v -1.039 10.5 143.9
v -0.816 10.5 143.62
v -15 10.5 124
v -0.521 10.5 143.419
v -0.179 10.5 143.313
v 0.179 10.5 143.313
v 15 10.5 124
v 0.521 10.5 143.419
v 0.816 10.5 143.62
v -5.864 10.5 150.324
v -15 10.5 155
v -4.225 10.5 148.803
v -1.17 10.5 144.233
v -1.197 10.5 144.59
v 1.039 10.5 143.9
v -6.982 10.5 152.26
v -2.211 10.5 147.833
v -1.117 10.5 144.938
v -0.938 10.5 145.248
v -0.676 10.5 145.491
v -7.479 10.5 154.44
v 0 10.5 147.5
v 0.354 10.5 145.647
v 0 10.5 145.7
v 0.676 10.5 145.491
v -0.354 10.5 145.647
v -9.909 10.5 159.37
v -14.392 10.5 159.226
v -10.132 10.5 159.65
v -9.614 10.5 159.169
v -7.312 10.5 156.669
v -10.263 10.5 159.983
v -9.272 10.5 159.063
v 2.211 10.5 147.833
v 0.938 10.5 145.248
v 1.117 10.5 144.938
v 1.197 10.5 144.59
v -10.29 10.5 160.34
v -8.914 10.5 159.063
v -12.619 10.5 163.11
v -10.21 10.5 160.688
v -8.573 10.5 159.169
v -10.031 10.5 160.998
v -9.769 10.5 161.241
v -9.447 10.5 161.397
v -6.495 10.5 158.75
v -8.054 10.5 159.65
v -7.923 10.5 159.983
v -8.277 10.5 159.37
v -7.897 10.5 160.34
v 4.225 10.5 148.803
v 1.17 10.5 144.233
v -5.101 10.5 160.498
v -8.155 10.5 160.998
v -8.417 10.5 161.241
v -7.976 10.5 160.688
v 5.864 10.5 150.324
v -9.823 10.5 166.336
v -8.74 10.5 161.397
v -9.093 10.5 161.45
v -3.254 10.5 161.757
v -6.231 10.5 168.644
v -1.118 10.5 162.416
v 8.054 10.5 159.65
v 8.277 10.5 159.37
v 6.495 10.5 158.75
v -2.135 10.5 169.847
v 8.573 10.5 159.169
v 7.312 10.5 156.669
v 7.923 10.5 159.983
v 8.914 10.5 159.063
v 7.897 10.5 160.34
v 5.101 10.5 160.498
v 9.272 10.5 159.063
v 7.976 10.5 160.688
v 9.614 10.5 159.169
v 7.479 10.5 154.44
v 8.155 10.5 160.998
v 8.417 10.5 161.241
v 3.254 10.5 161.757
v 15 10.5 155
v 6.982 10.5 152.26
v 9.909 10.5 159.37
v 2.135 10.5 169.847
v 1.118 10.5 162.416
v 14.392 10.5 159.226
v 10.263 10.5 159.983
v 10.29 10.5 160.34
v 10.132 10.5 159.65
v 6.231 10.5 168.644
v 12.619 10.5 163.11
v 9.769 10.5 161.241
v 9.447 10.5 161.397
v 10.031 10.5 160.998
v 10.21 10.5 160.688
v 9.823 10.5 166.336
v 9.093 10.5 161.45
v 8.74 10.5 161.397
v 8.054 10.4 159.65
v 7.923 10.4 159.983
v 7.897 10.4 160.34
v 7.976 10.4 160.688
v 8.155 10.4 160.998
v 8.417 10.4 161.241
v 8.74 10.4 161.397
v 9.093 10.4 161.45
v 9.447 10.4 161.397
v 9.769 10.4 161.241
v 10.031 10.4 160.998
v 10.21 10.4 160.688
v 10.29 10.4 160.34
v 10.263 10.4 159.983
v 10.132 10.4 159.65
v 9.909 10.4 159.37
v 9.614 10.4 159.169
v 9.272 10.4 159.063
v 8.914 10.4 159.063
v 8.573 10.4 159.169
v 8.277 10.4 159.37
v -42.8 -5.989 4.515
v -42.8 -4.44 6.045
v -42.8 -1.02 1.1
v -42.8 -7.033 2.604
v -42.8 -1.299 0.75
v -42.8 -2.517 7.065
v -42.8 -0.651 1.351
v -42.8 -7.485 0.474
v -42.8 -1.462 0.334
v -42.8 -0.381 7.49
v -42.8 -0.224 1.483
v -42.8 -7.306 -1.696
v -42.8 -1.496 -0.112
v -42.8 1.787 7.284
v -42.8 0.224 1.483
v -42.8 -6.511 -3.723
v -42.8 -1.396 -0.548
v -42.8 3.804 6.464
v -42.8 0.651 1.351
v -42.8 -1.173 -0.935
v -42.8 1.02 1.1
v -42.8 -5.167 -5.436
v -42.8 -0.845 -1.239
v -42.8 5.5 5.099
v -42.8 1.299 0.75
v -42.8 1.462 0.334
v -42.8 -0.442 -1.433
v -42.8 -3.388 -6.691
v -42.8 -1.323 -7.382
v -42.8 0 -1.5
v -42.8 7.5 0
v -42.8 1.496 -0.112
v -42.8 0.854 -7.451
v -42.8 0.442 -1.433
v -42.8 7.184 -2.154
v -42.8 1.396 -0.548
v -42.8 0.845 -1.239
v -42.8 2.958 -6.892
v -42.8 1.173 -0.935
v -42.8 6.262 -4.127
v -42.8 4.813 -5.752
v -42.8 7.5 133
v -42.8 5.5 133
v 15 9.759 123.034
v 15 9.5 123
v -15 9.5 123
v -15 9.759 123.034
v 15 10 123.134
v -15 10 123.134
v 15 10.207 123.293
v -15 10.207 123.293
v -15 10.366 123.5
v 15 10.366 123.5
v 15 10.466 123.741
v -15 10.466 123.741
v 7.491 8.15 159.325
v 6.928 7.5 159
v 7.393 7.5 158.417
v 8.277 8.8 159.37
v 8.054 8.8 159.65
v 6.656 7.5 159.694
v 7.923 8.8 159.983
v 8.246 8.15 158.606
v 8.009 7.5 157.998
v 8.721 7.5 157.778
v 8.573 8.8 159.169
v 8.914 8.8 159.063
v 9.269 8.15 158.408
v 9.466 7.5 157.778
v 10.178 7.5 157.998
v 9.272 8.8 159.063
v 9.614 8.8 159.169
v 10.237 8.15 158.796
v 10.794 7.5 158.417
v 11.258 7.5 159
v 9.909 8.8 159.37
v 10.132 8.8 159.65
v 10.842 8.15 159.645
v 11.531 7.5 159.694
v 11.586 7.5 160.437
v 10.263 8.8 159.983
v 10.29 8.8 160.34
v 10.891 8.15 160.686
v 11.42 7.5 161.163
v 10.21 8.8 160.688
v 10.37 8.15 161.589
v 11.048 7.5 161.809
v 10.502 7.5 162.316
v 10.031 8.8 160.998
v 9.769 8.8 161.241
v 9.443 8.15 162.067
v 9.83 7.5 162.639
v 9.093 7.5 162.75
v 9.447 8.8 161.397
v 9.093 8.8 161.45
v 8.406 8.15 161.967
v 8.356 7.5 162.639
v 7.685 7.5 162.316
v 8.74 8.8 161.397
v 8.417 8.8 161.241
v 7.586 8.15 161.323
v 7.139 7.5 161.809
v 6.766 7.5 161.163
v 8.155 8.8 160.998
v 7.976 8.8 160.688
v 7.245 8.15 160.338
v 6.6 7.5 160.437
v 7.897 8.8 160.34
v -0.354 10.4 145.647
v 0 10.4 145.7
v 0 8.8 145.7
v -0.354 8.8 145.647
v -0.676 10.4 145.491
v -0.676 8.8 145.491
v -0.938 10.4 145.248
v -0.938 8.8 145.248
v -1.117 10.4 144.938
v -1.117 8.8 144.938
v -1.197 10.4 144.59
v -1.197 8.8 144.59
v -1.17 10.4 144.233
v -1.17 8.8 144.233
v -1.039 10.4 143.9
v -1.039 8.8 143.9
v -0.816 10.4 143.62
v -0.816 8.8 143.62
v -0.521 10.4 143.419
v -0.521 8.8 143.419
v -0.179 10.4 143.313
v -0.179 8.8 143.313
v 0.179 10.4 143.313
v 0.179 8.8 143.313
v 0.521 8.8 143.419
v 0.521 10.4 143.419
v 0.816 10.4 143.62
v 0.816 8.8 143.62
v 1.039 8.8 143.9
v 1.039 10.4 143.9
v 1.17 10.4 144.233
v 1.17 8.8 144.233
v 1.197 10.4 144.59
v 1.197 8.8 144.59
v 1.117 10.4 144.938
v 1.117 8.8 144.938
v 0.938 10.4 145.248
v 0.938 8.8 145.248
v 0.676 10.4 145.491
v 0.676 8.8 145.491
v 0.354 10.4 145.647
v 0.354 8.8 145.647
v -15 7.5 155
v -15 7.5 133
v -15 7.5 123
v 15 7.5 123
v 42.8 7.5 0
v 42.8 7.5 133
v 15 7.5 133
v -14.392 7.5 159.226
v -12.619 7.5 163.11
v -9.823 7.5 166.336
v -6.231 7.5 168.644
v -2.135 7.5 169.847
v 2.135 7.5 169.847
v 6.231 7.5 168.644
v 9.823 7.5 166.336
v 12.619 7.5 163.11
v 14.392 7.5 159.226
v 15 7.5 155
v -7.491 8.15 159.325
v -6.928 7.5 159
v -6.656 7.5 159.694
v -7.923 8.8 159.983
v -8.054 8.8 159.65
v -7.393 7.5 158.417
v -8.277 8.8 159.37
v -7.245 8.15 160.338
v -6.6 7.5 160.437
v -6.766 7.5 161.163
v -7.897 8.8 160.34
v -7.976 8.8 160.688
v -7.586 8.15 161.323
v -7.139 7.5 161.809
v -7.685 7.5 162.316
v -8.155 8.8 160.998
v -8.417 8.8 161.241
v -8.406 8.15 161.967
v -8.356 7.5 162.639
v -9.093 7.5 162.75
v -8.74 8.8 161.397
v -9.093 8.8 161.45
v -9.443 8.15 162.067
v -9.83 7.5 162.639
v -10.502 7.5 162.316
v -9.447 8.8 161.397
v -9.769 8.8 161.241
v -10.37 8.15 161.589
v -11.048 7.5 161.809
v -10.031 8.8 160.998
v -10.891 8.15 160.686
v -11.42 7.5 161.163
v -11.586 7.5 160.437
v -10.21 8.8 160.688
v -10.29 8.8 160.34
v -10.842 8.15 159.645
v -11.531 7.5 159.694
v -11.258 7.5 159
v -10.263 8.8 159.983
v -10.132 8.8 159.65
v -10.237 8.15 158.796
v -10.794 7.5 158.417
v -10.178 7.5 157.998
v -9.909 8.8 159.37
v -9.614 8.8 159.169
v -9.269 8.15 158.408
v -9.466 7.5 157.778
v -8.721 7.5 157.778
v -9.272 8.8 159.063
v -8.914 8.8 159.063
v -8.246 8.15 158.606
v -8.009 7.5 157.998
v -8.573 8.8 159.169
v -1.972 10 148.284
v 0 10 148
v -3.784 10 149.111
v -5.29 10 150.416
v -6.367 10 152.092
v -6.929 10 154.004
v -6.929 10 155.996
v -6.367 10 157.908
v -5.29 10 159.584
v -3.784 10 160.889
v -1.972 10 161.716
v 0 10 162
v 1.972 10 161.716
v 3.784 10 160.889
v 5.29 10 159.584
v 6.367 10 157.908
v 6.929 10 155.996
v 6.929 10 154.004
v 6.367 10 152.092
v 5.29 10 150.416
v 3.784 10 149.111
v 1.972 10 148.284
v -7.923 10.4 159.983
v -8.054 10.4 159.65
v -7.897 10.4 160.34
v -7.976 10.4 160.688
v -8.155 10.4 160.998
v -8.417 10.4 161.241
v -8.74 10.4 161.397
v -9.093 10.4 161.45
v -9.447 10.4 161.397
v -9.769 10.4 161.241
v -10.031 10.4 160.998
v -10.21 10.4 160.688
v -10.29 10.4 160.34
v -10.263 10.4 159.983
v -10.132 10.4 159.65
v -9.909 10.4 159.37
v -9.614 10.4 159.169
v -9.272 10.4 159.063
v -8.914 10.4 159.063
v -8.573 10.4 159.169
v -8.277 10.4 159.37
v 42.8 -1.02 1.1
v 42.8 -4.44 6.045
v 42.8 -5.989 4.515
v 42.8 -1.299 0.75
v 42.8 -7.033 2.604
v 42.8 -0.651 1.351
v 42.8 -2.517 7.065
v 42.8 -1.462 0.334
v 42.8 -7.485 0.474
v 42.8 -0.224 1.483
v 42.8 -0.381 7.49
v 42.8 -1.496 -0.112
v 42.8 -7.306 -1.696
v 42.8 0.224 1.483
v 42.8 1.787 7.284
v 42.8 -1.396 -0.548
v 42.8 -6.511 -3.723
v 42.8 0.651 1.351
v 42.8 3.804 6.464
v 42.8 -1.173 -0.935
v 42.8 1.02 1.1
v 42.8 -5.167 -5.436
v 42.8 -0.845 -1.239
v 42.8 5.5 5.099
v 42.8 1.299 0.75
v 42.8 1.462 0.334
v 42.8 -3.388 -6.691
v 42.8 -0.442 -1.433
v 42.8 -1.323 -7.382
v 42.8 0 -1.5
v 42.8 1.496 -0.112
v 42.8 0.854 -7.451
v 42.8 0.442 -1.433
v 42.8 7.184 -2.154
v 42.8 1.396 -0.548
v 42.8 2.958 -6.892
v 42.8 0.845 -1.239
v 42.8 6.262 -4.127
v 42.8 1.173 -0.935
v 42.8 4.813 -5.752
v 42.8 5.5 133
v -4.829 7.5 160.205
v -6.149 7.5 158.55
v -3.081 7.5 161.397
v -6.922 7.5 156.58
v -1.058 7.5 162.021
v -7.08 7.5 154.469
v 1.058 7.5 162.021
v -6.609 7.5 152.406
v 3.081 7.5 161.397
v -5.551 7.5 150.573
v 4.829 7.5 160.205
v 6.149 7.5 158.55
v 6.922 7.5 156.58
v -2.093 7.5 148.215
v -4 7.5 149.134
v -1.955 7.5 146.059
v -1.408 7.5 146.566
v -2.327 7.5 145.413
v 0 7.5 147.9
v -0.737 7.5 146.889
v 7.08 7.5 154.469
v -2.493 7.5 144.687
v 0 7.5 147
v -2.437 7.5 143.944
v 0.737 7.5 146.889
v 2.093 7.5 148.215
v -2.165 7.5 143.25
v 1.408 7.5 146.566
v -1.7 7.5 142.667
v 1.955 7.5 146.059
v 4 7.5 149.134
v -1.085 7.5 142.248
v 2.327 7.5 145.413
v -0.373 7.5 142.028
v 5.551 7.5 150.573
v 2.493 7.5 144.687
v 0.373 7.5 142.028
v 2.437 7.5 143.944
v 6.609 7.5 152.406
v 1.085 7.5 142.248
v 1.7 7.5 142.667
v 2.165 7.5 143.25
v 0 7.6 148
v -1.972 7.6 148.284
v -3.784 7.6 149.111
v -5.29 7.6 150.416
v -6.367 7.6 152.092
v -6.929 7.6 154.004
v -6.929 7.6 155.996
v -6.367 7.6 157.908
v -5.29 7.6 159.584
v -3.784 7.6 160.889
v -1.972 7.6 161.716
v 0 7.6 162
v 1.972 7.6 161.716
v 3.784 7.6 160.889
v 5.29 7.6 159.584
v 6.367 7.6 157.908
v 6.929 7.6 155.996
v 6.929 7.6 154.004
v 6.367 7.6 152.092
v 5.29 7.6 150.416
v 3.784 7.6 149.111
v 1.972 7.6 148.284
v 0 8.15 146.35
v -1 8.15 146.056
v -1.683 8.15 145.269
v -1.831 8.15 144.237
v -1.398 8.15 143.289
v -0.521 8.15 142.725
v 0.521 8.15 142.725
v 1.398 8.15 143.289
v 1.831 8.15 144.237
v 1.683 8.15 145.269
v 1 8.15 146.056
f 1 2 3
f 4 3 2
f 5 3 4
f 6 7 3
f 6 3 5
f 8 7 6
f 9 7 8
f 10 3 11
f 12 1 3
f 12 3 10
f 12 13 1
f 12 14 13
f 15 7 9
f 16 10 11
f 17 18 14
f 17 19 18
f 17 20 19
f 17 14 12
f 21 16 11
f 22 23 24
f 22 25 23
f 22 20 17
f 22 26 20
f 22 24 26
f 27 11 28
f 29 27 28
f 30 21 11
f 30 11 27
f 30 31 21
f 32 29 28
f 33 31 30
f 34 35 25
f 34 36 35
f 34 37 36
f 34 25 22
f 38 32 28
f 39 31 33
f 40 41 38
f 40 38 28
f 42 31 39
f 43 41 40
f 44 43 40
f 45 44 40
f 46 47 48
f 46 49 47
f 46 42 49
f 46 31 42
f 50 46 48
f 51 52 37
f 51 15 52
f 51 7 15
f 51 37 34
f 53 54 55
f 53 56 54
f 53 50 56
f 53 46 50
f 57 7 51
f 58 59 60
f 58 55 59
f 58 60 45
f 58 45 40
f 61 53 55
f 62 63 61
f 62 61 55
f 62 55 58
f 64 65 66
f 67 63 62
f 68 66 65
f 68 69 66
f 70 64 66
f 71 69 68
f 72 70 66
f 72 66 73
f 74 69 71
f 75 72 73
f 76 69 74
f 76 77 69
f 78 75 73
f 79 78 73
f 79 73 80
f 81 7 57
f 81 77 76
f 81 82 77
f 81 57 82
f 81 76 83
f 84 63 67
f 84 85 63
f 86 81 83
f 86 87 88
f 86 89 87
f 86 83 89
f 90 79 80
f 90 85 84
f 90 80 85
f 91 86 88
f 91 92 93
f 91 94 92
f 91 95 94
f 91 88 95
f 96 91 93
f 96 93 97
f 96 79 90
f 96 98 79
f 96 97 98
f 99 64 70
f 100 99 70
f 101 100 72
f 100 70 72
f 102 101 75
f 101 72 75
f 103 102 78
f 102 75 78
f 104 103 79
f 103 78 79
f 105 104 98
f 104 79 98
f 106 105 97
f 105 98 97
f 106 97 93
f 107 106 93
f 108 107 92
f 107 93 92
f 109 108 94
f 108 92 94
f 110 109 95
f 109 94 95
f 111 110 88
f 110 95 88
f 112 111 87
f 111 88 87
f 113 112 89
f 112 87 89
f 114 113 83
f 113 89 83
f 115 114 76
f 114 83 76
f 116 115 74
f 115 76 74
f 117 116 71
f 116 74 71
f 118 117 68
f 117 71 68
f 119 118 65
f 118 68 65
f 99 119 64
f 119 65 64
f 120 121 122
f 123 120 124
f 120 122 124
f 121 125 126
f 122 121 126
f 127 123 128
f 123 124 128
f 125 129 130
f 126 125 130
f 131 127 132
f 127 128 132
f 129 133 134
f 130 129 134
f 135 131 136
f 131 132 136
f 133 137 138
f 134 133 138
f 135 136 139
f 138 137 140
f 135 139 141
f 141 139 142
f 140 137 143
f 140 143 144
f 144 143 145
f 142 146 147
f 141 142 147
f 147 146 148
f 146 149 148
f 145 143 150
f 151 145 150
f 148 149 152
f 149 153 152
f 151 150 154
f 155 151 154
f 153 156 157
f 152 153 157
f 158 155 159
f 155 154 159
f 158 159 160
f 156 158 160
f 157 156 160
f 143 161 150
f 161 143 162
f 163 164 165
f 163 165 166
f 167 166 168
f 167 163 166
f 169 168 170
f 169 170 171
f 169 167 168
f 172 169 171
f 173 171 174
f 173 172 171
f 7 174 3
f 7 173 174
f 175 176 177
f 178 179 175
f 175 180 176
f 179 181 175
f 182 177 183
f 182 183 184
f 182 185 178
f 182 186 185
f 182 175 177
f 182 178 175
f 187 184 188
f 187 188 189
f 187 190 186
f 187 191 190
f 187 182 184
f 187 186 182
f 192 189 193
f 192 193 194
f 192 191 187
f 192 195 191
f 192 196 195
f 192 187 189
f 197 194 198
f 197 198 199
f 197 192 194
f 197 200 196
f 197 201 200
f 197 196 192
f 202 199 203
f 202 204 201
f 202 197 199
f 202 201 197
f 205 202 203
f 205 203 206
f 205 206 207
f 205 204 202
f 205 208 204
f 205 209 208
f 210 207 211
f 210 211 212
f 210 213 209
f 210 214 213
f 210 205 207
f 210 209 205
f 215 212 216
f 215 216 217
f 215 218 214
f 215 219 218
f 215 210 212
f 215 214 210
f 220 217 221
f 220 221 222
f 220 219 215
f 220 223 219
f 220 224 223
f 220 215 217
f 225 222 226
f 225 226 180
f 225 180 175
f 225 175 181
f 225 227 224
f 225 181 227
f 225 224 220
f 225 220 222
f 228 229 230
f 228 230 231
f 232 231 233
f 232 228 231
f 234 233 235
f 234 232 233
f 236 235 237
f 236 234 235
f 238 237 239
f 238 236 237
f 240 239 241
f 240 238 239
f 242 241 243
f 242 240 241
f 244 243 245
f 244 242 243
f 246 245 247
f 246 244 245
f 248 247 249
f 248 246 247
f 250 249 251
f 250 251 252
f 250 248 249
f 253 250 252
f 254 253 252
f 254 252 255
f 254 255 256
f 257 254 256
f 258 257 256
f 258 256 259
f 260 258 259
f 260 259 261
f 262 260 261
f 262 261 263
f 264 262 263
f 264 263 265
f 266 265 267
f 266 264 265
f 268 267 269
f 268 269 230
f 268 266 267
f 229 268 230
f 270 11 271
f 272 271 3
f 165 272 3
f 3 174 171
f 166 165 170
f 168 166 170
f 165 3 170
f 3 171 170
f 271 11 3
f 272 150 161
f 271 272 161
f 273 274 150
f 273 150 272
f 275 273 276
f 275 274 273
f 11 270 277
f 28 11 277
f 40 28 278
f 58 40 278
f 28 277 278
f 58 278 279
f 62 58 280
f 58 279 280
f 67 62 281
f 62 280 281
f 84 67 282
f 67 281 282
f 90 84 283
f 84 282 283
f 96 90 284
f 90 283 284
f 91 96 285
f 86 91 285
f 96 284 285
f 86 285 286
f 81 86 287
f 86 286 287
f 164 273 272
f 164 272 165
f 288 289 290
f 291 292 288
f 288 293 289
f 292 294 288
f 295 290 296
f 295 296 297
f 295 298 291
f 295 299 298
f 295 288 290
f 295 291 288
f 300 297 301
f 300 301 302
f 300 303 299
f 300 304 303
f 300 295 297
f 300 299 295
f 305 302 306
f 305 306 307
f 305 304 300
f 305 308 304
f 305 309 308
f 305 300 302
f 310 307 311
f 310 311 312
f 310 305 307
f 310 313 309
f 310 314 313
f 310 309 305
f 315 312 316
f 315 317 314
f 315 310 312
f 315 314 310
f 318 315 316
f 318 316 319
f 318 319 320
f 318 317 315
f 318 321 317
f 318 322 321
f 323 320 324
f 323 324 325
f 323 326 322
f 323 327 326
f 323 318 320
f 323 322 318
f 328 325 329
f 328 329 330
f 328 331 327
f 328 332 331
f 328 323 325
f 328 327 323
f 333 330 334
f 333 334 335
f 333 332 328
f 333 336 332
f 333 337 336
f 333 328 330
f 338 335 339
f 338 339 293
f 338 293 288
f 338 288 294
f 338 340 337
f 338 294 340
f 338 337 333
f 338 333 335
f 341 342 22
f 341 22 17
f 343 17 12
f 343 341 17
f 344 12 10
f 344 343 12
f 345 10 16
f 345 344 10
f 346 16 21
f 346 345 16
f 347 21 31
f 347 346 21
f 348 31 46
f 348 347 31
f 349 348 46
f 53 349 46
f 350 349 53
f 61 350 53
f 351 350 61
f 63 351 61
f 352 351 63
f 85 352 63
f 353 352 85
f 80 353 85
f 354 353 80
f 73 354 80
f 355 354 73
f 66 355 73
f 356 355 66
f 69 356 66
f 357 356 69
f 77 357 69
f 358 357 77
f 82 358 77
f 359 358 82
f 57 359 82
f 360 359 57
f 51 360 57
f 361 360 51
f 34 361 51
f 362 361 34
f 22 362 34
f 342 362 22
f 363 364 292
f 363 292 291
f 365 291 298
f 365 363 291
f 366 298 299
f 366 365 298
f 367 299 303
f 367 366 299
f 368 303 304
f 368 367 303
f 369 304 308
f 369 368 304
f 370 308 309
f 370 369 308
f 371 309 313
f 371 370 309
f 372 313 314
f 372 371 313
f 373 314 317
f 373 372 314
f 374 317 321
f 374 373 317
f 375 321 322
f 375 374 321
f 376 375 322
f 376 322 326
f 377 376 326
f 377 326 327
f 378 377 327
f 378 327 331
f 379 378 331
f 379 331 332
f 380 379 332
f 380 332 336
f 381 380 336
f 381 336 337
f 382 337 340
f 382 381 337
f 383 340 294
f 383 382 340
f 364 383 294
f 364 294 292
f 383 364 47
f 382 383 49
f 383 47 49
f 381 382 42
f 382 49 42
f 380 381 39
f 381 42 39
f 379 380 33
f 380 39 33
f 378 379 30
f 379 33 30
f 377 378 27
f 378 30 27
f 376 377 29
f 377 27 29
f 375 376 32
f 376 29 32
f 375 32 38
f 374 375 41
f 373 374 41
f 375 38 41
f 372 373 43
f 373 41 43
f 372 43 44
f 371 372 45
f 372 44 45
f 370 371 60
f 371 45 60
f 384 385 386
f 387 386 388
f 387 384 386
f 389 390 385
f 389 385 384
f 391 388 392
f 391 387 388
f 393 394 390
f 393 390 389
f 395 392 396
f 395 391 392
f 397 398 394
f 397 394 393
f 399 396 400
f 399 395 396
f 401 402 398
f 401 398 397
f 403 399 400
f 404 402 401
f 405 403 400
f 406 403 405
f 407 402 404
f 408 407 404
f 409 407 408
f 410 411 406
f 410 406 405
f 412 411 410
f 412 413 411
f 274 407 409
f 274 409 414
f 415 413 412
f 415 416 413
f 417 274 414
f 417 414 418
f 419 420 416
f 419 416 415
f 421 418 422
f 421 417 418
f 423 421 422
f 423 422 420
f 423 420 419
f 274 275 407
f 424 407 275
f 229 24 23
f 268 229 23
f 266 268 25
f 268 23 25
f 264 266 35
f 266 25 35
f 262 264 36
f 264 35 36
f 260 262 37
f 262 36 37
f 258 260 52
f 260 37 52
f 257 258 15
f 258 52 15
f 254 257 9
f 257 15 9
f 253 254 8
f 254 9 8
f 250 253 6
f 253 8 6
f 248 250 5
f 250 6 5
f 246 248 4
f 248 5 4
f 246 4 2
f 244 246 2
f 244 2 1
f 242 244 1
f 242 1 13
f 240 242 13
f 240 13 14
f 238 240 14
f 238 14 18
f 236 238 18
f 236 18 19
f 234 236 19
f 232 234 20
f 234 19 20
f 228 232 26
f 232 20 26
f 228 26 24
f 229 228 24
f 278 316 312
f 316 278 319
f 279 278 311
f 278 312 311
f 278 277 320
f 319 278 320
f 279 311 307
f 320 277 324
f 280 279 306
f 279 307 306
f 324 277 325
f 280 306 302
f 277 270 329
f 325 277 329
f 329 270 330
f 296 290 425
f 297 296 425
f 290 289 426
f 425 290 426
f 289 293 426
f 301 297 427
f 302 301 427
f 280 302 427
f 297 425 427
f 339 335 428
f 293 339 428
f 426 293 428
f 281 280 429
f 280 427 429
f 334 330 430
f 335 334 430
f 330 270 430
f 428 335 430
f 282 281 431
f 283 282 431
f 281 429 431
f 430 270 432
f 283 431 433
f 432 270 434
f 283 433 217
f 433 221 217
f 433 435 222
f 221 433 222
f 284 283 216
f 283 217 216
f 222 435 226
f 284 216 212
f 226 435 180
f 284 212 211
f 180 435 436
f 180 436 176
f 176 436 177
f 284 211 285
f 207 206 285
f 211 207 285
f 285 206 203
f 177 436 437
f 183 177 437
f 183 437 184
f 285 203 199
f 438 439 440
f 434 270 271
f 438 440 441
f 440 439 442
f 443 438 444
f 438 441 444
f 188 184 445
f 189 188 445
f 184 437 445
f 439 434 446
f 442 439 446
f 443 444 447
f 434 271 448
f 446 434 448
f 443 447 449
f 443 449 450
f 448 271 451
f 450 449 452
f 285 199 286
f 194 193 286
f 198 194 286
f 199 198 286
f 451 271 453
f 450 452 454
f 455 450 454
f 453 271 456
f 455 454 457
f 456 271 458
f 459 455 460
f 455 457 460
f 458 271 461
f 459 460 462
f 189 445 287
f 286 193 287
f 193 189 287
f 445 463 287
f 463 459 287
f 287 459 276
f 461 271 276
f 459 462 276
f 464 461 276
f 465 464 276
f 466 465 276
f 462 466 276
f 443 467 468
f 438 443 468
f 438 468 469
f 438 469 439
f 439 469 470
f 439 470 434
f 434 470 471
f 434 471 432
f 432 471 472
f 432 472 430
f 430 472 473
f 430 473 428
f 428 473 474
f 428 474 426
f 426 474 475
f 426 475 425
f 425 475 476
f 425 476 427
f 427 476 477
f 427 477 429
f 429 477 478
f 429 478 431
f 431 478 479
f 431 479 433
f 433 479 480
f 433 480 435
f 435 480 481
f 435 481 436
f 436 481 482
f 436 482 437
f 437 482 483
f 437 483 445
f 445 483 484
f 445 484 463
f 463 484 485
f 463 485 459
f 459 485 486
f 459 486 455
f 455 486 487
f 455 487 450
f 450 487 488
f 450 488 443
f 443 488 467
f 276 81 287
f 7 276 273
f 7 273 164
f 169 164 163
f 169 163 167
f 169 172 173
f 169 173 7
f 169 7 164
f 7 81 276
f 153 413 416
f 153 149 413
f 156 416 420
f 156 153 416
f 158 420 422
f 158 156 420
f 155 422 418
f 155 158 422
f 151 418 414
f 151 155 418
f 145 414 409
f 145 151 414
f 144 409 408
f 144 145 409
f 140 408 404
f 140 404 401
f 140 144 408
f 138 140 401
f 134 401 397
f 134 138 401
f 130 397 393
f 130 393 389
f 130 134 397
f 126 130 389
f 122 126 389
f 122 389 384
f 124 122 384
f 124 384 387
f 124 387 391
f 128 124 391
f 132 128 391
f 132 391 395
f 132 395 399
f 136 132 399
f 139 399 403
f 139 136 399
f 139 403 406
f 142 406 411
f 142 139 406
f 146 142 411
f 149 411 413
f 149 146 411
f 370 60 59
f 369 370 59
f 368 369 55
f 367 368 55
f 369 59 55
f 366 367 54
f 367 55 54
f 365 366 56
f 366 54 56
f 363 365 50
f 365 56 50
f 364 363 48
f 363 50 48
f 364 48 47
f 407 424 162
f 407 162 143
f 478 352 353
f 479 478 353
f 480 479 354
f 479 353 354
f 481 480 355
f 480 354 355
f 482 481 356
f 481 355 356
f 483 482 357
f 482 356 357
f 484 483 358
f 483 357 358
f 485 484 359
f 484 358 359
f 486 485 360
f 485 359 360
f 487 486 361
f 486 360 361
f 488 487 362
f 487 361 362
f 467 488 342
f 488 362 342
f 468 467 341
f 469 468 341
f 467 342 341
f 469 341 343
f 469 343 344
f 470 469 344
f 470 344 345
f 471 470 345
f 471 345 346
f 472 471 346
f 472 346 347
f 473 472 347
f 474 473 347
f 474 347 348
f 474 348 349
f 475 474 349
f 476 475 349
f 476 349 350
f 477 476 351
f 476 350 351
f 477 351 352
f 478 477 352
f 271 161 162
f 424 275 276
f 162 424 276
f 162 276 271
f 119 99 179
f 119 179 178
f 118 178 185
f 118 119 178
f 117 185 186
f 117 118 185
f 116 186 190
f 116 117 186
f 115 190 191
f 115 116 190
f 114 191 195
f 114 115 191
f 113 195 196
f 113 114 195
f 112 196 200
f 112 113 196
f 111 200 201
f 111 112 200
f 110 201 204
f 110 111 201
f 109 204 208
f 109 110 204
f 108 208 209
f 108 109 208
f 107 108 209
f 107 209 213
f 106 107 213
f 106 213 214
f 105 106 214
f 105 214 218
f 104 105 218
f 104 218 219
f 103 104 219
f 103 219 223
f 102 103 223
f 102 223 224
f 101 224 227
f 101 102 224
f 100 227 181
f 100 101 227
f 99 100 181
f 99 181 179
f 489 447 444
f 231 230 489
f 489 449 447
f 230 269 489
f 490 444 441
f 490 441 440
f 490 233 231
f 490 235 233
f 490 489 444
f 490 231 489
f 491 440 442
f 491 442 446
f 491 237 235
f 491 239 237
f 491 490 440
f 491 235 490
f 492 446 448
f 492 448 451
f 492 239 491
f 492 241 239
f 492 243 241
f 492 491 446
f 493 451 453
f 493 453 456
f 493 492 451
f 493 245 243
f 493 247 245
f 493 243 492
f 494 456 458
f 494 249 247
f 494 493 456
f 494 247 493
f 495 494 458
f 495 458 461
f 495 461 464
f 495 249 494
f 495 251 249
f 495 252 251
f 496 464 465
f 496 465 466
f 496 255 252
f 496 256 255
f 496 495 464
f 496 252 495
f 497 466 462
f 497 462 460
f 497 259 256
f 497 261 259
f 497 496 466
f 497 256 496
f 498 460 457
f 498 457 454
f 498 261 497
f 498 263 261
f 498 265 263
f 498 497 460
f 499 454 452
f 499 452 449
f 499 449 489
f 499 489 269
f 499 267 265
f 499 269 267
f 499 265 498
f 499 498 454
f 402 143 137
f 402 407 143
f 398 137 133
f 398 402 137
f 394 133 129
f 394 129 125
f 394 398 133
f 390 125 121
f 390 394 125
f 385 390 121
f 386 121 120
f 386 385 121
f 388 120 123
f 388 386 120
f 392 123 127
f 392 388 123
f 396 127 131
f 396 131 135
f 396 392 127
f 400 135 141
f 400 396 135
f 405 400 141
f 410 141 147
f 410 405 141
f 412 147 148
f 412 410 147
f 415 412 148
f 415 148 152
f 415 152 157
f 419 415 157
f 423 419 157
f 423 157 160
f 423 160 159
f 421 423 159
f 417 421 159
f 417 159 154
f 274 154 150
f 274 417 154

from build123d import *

# Parameters (mm, degrees)
SKETCH1_R           = 1.5
BOSS_EXTRUDE1_DEPTH = 42.8
BOSS_EXTRUDE2_DEPTH = 3
BOSS_EXTRUDE3_DEPTH = 30
CUT_EXTRUDE1_REACH  = 178.227
SKETCH4_R           = 7.000000000000002
SKETCH5_R           = 1.200000000000002
SKETCH5_R_2         = 1.199999999999986
SKETCH5_R_3         = 1.2000000000000053
CUT_EXTRUDE2_DEPTH  = 0.1
CIRPATTERN1_COUNT   = 3


with BuildPart() as part:
    # Sketch1 → Boss-Extrude1 (new, symmetric)
    with BuildSketch(Plane(origin=(0, 0, 0), x_dir=(0, 0, -1), z_dir=(1, 0, 0))):
        with BuildLine():
            Line((-9.2e-16, 7.500000000000001), (-133, 7.499999999999983))
            Line((-133, 7.499999999999983), (-133, 5.499999999999983))
            Line((-133, 5.499999999999983), (-5.099019513592791, 5.499999999999995))
            ThreePointArc((-5.099019513592791, 5.499999999999995), (2.738612787525835, -6.982120021884469), (-9.2e-16, 7.500000000000001))
        make_face()
        Circle(SKETCH1_R, mode=Mode.SUBTRACT)
    extrude(amount=BOSS_EXTRUDE1_DEPTH, both=True)



with BuildPart() as body_2:
    # Sketch2 → Boss-Extrude2 (new body)
    with BuildSketch(Plane(origin=(0, 7.500000000000001, 9.8e-16), x_dir=(1, 0, 0), z_dir=(0, 1, 1.3e-16))):
        with BuildLine():
            Line((15.000000000000007, -155), (15.000000000000007, -133))
            Line((15.000000000000007, -133), (-15.000000000000007, -133))
            Line((-15.000000000000007, -133), (-15.000000000000007, -155))
            ThreePointArc((-15.000000000000007, -155), (-2.76e-15, -170), (15.000000000000007, -155))
        make_face()
    extrude(amount=BOSS_EXTRUDE2_DEPTH)


with BuildPart() as part_1:
    add(part.part)

    add(body_2.part)  # Boss-Extrude3 merges body 2
    # Sketch3 → Boss-Extrude3 (add)
    with BuildSketch(Plane(origin=(15.000000000000007, 0, 0), x_dir=(0, 0, -1), z_dir=(1, 0, 0))):
        with BuildLine():
            Line((-133, 10.499999999999984), (-133, 7.499999999999983))
            Line((-133, 7.499999999999983), (-123.00000000000001, 7.500000000000002))
            Line((-123.00000000000001, 7.500000000000002), (-123.00000000000001, 9.499999999999975))
            ThreePointArc((-123.00000000000001, 9.499999999999975), (-123.29289321881346, 10.207106781186528), (-124.00000000000001, 10.499999999999984))
            Line((-124.00000000000001, 10.499999999999984), (-133, 10.499999999999984))
        make_face()
    extrude(amount=-BOSS_EXTRUDE3_DEPTH)

    # Sketch4 → Cut-Extrude1 (cut, up to next)
    with BuildSketch(Plane(origin=(0, 10.499999999999984, 0), x_dir=(1, 0, 0), z_dir=(0, 1, 0)), mode=Mode.PRIVATE) as cut_extrude1_sk1:
        with Locations(Location((0, -155, 0), (0, 0, 270))):
            Circle(SKETCH4_R)
    cut_extrude1_tool1 = extrude(cut_extrude1_sk1.sketch, amount=-CUT_EXTRUDE1_REACH, mode=Mode.PRIVATE) & part_1.part
    add(cut_extrude1_tool1.solids().sort_by_distance((0, 10.5, 155))[0], mode=Mode.SUBTRACT)

    # Sketch5 → Cut-Extrude2 (cut)
    with BuildSketch(Plane(origin=(0, 10.499999999999984, 0), x_dir=(1, 0, 0), z_dir=(0, 1, 0))):
        with Locations(Location((0, -144.5, 0), (0, 0, 270))):
            Circle(SKETCH5_R)
        with Locations(Location((9.093266739737038, -160.24999999999977, 0), (0, 0, 270))):
            Circle(SKETCH5_R_2)
        with Locations(Location((-9.093266739736205, -160.25000000000017, 0), (0, 0, 270))):
            Circle(SKETCH5_R_3)
    extrude(amount=-CUT_EXTRUDE2_DEPTH, mode=Mode.SUBTRACT)

    # Sketch6 → Cut-Revolve1 (revolve, cut)
    with BuildSketch(Plane(origin=(0, 0, 0), x_dir=(0, 0, -1), z_dir=(1, 0, 0)), mode=Mode.PRIVATE) as cut_revolve1_sk:
        Polygon((-144.5, 7.499999999999982), (-142, 7.4999999999999805), (-143.29999999999998, 8.799999999999951), (-143.29999999999998, 9.799999999999965), (-143.29999999999998, 10.499999999999984), (-144.5, 10.499999999999984), align=None)
    cut_revolve1 = revolve(cut_revolve1_sk.sketch.rotate(Axis((0, 10.499999999999984, 144.5), (0, -1, 0)), 180), axis=Axis((0, 10.499999999999984, 144.5), (0, -1, 0)), mode=Mode.SUBTRACT)

    # CirPattern1: Cut-Revolve1 ×3 about axis
    cirpattern1_axis = Axis((-4.63e-15, 0, 155), (0, 1, 0))
    for i in range(1, CIRPATTERN1_COUNT):
        add(cut_revolve1.rotate(cirpattern1_axis, i * 360 / CIRPATTERN1_COUNT), mode=Mode.SUBTRACT)

    # Sketch7 → Cut-Revolve2 (revolve, cut)
    with BuildSketch(Plane(origin=(0, 0, 0), x_dir=(0, 0, -1), z_dir=(1, 0, 0))):
        Polygon((-148, 7.499999999999981), (-147.9, 7.499999999999981), (-148, 7.599999999999977), align=None)
        Polygon((-148, 10.499999999999984), (-147.5, 10.499999999999984), (-148, 9.99999999999998), (-155, 9.99999999999998), (-155, 10.499999999999984), align=None)
    revolve(axis=Axis((0, 7.4999999999999805, 155), (0, 1, 0)), mode=Mode.SUBTRACT)


solid = part_1.part
